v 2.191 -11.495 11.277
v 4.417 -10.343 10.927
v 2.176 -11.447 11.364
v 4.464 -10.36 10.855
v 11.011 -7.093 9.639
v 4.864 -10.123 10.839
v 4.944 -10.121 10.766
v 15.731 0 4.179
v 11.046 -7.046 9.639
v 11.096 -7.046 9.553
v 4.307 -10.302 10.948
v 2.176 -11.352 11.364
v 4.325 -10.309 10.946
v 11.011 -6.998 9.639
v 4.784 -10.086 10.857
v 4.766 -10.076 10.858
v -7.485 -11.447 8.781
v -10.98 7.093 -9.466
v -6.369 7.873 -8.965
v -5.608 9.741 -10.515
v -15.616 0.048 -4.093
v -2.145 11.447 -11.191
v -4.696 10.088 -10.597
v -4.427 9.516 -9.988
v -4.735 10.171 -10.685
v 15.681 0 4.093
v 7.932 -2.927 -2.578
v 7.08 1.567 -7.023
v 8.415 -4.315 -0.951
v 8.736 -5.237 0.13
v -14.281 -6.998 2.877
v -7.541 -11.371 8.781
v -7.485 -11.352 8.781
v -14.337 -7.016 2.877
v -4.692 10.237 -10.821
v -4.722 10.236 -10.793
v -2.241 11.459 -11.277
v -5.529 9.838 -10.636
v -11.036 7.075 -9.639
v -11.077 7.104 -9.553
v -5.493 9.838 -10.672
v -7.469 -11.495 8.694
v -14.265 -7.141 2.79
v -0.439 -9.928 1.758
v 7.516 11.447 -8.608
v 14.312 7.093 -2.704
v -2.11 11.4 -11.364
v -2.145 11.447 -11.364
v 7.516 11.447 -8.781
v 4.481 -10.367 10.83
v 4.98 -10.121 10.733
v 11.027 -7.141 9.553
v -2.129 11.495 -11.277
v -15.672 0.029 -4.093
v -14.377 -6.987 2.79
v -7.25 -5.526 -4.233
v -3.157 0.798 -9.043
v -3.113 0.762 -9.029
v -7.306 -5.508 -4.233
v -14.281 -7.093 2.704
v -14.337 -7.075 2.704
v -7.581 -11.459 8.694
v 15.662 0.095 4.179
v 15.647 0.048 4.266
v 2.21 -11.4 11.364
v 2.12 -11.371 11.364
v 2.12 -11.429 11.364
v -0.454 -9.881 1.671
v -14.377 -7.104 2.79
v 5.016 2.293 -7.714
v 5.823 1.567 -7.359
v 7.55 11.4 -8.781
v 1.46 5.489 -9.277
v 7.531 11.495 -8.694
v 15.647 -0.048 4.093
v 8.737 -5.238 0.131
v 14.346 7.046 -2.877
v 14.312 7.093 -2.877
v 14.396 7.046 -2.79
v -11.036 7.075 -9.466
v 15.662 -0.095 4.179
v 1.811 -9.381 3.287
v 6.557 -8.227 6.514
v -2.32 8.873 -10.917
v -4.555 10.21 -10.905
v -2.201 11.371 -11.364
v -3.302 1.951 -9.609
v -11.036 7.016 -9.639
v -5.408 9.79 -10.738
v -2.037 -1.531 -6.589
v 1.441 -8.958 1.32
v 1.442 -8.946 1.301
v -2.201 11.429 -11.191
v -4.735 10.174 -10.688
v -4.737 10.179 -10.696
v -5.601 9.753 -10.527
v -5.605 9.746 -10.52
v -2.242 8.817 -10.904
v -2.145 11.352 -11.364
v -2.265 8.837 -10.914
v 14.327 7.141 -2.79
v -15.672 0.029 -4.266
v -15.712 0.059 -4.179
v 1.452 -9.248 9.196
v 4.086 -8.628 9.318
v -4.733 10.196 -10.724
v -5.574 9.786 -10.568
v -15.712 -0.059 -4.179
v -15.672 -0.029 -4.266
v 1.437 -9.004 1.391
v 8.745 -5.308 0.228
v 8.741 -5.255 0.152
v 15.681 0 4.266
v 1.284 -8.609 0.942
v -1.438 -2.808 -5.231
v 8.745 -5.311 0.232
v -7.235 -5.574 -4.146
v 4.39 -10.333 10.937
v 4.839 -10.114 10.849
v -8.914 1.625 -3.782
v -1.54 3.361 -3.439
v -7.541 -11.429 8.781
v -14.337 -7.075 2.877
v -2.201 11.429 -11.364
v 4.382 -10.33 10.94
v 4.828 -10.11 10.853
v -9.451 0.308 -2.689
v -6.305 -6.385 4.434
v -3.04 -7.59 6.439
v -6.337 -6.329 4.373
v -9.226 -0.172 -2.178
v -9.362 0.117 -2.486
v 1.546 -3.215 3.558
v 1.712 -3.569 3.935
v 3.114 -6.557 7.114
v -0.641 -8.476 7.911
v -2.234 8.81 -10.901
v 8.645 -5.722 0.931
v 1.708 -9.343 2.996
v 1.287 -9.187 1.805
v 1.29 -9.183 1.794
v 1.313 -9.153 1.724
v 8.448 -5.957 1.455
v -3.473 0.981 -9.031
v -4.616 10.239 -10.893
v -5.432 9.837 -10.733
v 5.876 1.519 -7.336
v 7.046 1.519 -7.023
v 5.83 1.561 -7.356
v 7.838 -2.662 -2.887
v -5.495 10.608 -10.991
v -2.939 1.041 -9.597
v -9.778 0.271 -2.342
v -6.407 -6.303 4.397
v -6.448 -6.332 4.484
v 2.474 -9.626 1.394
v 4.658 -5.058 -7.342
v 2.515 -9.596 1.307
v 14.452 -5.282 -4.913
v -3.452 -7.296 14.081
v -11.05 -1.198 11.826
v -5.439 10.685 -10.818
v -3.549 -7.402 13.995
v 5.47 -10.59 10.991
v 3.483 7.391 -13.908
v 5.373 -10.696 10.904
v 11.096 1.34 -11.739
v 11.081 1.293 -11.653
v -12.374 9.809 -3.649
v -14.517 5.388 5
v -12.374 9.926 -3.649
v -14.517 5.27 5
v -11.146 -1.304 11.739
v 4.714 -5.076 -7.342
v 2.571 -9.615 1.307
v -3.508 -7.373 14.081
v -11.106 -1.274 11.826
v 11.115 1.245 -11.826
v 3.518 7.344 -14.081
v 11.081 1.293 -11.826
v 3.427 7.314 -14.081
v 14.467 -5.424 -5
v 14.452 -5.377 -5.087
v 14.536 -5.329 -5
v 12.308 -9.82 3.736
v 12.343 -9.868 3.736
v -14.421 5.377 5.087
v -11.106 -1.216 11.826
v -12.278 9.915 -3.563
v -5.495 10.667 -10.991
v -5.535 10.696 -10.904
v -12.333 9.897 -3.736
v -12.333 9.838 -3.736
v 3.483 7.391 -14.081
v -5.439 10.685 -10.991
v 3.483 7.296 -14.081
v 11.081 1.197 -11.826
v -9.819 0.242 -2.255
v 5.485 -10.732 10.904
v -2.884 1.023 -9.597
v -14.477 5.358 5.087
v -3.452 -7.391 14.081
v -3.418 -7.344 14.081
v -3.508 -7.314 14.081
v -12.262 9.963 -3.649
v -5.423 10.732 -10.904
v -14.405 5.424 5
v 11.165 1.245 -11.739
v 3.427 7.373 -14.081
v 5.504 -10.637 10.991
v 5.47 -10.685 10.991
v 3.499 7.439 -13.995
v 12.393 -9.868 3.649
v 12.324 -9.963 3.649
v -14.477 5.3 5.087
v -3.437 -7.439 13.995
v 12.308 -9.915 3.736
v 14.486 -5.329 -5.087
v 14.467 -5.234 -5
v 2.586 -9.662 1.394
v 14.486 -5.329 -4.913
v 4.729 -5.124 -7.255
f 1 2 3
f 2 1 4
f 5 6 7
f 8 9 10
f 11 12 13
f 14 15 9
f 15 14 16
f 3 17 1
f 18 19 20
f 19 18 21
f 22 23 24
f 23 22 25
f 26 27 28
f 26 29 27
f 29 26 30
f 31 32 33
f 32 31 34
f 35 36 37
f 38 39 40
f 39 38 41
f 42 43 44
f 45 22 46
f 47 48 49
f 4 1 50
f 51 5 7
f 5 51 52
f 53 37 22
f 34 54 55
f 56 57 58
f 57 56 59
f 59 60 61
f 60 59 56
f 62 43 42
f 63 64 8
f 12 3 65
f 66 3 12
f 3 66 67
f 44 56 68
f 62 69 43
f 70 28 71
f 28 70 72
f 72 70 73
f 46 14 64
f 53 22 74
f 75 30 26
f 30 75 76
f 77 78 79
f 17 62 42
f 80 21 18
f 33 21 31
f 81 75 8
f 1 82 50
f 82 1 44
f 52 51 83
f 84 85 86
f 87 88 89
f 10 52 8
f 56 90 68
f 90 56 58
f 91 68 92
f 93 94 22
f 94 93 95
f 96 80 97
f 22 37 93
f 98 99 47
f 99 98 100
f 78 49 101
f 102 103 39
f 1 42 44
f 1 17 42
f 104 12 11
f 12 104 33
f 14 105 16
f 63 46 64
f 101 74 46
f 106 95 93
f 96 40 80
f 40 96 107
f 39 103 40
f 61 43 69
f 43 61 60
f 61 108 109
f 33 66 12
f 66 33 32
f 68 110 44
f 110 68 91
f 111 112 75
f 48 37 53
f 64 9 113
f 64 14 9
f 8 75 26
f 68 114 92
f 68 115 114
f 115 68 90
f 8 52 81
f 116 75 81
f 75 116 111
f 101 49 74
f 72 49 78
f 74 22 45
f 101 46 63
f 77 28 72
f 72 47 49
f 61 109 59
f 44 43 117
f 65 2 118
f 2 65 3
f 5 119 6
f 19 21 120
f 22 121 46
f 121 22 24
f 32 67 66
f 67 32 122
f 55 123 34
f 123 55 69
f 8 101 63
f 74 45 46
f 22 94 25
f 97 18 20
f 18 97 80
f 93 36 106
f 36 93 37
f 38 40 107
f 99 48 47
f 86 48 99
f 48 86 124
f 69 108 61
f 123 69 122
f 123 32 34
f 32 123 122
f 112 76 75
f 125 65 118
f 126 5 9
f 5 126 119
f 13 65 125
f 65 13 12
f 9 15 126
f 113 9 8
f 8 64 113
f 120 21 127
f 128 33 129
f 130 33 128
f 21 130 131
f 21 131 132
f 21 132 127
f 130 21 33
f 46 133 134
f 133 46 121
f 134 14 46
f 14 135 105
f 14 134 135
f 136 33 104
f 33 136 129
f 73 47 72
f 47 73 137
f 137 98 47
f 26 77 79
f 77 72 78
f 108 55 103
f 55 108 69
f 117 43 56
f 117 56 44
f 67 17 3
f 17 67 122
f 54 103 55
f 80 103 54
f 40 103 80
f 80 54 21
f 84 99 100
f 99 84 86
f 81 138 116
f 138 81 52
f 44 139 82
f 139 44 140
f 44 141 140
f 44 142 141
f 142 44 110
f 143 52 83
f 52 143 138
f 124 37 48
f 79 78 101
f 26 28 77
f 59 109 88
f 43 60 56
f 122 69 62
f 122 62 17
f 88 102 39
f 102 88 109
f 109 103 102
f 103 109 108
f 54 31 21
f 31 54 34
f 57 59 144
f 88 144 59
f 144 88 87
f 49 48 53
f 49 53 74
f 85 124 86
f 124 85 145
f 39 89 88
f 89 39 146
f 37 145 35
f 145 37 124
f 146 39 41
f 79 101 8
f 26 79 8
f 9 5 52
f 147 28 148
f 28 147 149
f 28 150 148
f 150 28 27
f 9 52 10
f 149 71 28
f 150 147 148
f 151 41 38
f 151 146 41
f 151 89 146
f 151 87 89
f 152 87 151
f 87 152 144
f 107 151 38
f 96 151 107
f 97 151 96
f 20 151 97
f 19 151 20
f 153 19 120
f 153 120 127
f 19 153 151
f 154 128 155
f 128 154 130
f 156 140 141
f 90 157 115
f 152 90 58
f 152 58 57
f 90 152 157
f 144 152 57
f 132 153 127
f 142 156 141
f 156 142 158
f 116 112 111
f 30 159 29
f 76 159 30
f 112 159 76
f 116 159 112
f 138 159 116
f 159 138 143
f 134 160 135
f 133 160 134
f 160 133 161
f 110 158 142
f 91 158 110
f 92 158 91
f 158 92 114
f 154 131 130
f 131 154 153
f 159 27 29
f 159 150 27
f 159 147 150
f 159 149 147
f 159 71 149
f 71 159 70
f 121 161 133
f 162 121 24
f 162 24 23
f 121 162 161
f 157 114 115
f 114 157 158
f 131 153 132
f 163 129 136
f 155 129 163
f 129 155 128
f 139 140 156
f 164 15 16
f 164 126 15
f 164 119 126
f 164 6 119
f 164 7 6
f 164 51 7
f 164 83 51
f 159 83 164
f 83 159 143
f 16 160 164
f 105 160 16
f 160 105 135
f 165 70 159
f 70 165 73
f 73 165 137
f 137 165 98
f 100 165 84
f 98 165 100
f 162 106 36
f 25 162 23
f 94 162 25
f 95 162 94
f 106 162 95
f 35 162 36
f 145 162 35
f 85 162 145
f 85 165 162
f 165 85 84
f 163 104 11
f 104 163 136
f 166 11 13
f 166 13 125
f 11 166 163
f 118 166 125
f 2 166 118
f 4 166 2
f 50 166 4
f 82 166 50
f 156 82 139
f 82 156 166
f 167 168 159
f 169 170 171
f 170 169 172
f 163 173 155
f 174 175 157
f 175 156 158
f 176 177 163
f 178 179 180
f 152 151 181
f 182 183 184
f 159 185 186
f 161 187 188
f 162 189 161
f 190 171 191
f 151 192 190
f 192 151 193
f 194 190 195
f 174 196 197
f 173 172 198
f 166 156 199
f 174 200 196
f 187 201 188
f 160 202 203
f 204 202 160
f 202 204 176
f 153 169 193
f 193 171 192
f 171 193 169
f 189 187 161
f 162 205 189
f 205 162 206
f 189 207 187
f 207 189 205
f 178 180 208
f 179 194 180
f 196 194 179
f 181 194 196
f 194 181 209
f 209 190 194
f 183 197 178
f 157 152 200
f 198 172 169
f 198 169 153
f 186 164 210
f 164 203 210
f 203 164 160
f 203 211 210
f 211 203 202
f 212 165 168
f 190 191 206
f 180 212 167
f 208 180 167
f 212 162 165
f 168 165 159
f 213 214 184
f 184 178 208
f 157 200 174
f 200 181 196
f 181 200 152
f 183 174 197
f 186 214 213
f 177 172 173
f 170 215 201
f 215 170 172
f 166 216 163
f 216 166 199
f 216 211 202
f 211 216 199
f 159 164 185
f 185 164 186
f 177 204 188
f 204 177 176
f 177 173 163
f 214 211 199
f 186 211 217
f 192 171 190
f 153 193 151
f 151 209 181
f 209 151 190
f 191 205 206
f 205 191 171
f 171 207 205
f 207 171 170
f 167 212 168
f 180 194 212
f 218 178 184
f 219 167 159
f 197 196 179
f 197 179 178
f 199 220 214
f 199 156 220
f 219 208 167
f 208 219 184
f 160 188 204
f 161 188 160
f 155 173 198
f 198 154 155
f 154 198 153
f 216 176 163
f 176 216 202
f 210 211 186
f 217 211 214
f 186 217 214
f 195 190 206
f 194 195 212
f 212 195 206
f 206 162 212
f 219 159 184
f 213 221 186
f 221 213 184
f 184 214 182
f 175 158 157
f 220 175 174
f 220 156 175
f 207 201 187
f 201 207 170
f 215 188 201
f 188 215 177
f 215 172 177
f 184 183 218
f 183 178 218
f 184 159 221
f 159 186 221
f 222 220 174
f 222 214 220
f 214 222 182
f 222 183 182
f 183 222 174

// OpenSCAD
// Auto-generated OpenSCAD file

    inner_points = 10*[[-1.4436247026081666, 0.53290472179478, 0.5000000000005375], [1.4436191328390864, -0.5329090469609368, -0.5000000000005375], [-1.1065387952767085, -0.12450860318088203, 1.1739293814812473], [-1.2292961042735038, 0.9867657297769106, -0.36491238710543017], [1.2292905345044236, -0.9867700549430674, 0.36491238710543017], [1.1065332255076283, 0.12450427801472524, -1.1739293814812473], [-0.3467937417511487, -0.7343646996664531, 1.3994576396282619], [-0.5454192400754369, 1.0637149418846232, -1.0904406452529822], [0.5454136703063569, -1.06371926705078, 1.0904406452529822], [0.3467881719820686, 0.7343603745002963, -1.3994576396282619], [-0.9737754103851414, 0.030062411297536226, -0.22552825814749344], [0.4698465073384851, -0.5028444730803222, -0.7255282581480309], [-0.6366895030536831, -0.6273509136781259, 0.44840112333321624], [0.25551790900382226, -0.9567054810624528, 0.13938412895793664], [-0.28989854618707456, 0.10701162340524878, -0.9510565162950456]];

    outer_points = 10*[[1.5631233177982589, 0.0, 0.4179467455373456], [-1.5631233177982589, 0.0, -0.4179467455373456], [1.4296084444676138, 0.7045531263704787, -0.27903149710806596], [1.0995782123374722, -0.7045531263704787, 0.9552835368748945], [-1.0995782123374722, 0.7045531263704787, -0.9552835368748945], [-1.4296084444676138, -0.7045531263704787, 0.27903149710806596], [0.750031735954207, 1.1399909053474344, -0.8694291917899644], [0.2160316030526203, -1.1399909053474344, 1.1277344860194474], [-0.2160316030526203, 1.1399909053474344, -1.1277344860194474], [-0.750031735954207, -1.1399909053474344, 0.8694291917899644], [0.8365540911892785, -0.5478743958362549, 0.0033013484425665762], [-0.7265692266089804, -0.5478743958362549, -0.41464539709477904], [0.7030392178586335, 0.1566787305342239, -0.6936768942028451], [-0.26302412114819385, 0.1566787305342239, -0.9519821884323281], [-0.04699251809557352, -0.9833121748132105, 0.1757522975871193]];

    // Convex hull for inner set (I)
    module inner_hull() {
        hull() {
            for (p = inner_points) {
                translate(p) sphere(r=0.1);
            }
        }
    }

    // Convex hull for outer set (O) minus inner hull (O \ I)
    module outer_minus_inner() {
        difference() {
            hull() {
                for (p = outer_points) {
                    translate(p) sphere(r=0.1);
                }
            }
            inner_hull(); // Subtract inner hull
        }
    }

    // Convex hull for outer set (O) minus all translated inner hulls
    module outer_minus_AllTranslationInner() {
        difference() {
            hull() {
                for (p = outer_points) {
                    translate(p) sphere(r=0.1);
                }
            }
            hull() {
                translate([0,0,50]) inner_hull();
                translate([0,0,-50]) inner_hull();
            }; // Subtract translated inner hulls
        }
    }

    // Difference between outer_minus_inner and outer_minus_AllTranslationInner
    module outer_minus_inner_diff() {
        difference() {
            // Outer minus inner
            difference() {
                hull() {
                    for (p = outer_points) {
                        translate(p) sphere(r=0.1);
                    }
                }
                inner_hull();
            }

            // Subtract Outer minus AllTranslationInner
            difference() {
                hull() {
                    for (p = outer_points) {
                        translate(p) sphere(r=0.1);
                    }
                }
                hull() {
                    translate([0,0,50]) inner_hull();
                    translate([0,0,-50]) inner_hull();
                };
            }
        }
    }

    // Rendering all with colors applied
    color([1, 0, 0, 0.5]) inner_hull(); // Transparent red
    color([0, 1, 0, 1]) outer_minus_AllTranslationInner(); // Opaque green
    color([1, 1, 0, 1]) outer_minus_inner_diff(); // Opaque yellow
    
